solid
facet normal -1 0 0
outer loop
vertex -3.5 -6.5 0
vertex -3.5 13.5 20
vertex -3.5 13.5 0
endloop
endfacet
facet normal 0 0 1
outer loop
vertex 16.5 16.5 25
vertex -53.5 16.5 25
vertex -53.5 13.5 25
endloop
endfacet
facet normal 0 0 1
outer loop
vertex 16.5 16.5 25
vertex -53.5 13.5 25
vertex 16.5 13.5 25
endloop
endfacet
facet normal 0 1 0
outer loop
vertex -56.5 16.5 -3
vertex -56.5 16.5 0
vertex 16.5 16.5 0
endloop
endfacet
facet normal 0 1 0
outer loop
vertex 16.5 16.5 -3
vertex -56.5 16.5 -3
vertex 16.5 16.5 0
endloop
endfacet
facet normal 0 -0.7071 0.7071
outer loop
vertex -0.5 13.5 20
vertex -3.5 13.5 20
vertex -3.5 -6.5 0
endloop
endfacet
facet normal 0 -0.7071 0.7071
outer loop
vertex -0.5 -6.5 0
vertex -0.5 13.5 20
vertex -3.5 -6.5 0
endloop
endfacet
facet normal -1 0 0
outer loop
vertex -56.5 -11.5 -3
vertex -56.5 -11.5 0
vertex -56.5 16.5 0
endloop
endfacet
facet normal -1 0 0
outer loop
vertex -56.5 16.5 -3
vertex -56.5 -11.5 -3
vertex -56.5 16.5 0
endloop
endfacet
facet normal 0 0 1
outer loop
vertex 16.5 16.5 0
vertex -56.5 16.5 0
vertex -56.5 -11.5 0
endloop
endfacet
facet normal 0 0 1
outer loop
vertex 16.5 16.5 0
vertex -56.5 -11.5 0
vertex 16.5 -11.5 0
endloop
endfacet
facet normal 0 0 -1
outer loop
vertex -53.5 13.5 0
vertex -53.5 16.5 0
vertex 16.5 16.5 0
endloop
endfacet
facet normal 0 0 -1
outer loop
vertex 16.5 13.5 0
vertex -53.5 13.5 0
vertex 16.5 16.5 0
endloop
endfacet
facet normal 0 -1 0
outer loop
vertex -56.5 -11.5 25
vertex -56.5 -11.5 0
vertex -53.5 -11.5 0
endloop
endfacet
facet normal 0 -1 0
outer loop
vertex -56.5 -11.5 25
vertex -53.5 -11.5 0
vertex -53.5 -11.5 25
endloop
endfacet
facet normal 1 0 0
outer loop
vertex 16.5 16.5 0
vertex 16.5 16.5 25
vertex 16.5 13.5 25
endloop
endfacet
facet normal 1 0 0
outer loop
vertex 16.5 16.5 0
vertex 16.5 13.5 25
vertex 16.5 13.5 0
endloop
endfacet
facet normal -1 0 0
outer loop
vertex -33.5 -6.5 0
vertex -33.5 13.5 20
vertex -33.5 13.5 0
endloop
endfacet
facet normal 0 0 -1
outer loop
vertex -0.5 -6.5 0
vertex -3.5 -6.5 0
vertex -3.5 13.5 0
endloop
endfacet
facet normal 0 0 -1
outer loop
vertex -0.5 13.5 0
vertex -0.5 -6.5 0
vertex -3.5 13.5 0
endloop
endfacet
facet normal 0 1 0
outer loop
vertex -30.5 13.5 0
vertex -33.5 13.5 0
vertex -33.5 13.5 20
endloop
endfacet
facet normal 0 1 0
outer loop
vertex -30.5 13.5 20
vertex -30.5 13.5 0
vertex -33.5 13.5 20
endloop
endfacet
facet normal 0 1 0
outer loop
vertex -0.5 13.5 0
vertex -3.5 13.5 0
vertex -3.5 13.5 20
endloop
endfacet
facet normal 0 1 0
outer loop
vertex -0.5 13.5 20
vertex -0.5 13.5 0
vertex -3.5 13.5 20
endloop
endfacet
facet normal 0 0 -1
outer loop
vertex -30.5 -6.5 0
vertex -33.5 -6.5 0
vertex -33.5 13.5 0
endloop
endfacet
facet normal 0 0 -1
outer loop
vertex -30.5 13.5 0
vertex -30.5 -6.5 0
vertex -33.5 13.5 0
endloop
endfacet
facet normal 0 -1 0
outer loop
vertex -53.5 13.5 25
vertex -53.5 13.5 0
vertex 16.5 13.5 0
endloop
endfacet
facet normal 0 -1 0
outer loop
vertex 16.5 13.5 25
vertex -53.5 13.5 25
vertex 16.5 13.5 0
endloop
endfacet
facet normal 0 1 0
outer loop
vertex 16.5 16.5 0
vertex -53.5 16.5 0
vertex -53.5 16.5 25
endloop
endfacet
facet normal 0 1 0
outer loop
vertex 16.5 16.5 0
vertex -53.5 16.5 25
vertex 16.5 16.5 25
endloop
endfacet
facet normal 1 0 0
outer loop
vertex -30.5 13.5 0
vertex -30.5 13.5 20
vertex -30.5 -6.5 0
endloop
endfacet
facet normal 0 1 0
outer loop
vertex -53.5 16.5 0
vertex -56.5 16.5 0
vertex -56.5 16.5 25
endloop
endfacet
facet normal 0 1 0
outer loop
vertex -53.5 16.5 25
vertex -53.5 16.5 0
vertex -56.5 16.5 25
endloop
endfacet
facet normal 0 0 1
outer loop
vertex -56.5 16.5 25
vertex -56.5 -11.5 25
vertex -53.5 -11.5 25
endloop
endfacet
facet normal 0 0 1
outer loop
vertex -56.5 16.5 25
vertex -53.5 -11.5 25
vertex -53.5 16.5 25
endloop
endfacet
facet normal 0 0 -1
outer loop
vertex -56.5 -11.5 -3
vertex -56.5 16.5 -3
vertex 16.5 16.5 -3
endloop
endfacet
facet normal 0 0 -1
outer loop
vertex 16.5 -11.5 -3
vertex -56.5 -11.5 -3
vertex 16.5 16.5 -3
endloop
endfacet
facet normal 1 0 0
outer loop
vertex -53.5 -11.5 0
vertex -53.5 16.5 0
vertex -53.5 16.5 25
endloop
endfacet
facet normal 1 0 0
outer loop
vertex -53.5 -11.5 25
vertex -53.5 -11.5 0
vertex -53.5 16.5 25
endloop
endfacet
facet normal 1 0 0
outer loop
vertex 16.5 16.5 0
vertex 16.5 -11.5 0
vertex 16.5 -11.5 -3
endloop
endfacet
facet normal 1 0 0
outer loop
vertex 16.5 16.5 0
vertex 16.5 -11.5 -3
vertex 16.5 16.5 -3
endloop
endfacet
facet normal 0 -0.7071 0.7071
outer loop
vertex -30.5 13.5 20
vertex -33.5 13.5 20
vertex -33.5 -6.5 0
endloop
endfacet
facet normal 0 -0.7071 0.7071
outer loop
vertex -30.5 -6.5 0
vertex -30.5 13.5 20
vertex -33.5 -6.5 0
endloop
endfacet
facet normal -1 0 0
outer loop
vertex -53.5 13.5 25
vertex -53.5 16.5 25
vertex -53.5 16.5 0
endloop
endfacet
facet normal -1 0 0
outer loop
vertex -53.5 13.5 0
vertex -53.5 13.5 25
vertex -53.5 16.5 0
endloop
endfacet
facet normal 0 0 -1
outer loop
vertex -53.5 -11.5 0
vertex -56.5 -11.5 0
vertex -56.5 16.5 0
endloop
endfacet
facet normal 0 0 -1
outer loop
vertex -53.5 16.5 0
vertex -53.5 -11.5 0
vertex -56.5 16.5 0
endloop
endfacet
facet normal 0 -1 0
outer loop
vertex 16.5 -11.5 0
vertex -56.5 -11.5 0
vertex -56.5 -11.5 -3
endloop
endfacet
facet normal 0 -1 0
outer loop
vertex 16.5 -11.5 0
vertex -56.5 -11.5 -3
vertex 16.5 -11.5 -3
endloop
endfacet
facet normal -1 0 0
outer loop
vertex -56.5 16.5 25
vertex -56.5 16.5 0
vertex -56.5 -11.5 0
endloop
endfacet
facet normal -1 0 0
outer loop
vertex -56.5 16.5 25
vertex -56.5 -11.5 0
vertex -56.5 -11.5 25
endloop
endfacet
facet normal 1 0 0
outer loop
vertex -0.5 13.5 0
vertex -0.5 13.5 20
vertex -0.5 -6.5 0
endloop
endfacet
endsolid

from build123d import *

# Parameters (mm, degrees)
SKETCH1_W           = 73
SKETCH1_H           = 28
BOSS_EXTRUDE1_DEPTH = 3
SKETCH3_W           = 70
SKETCH3_H           = 25
BOSS_EXTRUDE2_DEPTH = 3
BOSS_EXTRUDE3_START = 3
SKETCH4_W           = 25
SKETCH4_H           = 28
BOSS_EXTRUDE3_DEPTH = 3
BOSS_EXTRUDE4_START = 20
BOSS_EXTRUDE4_DEPTH = 3
BOSS_EXTRUDE5_START = 50
BOSS_EXTRUDE5_DEPTH = 3


with BuildPart() as part:
    # Sketch1 → Boss-Extrude1 (new body)
    with BuildSketch(Plane.XY):
        with Locations((-20, 2.5)):
            Rectangle(SKETCH1_W, SKETCH1_H)
    extrude(amount=-BOSS_EXTRUDE1_DEPTH)


with BuildPart() as body_2:
    # Sketch3 → Boss-Extrude2 (new body)
    with BuildSketch(Plane(origin=(0, 16.5, 0), x_dir=(1, 0, 0), z_dir=(0, 1, 0))):
        with Locations((-18.5, -12.5)):
            Rectangle(SKETCH3_W, SKETCH3_H)
    extrude(amount=-BOSS_EXTRUDE2_DEPTH)


with BuildPart() as body_3:
    # Sketch4 → Boss-Extrude3 (new body)
    with BuildSketch(Plane.ZY.offset(53.5).offset(BOSS_EXTRUDE3_START)):
        with Locations((12.5, 2.5)):
            Rectangle(SKETCH4_W, SKETCH4_H)
    extrude(amount=-BOSS_EXTRUDE3_DEPTH)


with BuildPart() as body_4:
    # Sketch5 → Boss-Extrude4 (new body)
    with BuildSketch(Plane(origin=(-53.5, 0, 0), x_dir=(0, 0, -1), z_dir=(1, 0, 0)).offset(BOSS_EXTRUDE4_START)):
        Polygon((-20, 13.5), (0, -6.5), (0, 13.5), align=None)
    extrude(amount=BOSS_EXTRUDE4_DEPTH)


with BuildPart() as body_5:
    # Sketch5<2> → Boss-Extrude5 (new body)
    with BuildSketch(Plane(origin=(-53.5, 0, 0), x_dir=(0, 0, -1), z_dir=(1, 0, 0)).offset(BOSS_EXTRUDE5_START)):
        Polygon((-20, 13.5), (0, -6.5), (0, 13.5), align=None)
    extrude(amount=BOSS_EXTRUDE5_DEPTH)


solid = Compound([part.part, body_2.part, body_3.part, body_4.part, body_5.part])
